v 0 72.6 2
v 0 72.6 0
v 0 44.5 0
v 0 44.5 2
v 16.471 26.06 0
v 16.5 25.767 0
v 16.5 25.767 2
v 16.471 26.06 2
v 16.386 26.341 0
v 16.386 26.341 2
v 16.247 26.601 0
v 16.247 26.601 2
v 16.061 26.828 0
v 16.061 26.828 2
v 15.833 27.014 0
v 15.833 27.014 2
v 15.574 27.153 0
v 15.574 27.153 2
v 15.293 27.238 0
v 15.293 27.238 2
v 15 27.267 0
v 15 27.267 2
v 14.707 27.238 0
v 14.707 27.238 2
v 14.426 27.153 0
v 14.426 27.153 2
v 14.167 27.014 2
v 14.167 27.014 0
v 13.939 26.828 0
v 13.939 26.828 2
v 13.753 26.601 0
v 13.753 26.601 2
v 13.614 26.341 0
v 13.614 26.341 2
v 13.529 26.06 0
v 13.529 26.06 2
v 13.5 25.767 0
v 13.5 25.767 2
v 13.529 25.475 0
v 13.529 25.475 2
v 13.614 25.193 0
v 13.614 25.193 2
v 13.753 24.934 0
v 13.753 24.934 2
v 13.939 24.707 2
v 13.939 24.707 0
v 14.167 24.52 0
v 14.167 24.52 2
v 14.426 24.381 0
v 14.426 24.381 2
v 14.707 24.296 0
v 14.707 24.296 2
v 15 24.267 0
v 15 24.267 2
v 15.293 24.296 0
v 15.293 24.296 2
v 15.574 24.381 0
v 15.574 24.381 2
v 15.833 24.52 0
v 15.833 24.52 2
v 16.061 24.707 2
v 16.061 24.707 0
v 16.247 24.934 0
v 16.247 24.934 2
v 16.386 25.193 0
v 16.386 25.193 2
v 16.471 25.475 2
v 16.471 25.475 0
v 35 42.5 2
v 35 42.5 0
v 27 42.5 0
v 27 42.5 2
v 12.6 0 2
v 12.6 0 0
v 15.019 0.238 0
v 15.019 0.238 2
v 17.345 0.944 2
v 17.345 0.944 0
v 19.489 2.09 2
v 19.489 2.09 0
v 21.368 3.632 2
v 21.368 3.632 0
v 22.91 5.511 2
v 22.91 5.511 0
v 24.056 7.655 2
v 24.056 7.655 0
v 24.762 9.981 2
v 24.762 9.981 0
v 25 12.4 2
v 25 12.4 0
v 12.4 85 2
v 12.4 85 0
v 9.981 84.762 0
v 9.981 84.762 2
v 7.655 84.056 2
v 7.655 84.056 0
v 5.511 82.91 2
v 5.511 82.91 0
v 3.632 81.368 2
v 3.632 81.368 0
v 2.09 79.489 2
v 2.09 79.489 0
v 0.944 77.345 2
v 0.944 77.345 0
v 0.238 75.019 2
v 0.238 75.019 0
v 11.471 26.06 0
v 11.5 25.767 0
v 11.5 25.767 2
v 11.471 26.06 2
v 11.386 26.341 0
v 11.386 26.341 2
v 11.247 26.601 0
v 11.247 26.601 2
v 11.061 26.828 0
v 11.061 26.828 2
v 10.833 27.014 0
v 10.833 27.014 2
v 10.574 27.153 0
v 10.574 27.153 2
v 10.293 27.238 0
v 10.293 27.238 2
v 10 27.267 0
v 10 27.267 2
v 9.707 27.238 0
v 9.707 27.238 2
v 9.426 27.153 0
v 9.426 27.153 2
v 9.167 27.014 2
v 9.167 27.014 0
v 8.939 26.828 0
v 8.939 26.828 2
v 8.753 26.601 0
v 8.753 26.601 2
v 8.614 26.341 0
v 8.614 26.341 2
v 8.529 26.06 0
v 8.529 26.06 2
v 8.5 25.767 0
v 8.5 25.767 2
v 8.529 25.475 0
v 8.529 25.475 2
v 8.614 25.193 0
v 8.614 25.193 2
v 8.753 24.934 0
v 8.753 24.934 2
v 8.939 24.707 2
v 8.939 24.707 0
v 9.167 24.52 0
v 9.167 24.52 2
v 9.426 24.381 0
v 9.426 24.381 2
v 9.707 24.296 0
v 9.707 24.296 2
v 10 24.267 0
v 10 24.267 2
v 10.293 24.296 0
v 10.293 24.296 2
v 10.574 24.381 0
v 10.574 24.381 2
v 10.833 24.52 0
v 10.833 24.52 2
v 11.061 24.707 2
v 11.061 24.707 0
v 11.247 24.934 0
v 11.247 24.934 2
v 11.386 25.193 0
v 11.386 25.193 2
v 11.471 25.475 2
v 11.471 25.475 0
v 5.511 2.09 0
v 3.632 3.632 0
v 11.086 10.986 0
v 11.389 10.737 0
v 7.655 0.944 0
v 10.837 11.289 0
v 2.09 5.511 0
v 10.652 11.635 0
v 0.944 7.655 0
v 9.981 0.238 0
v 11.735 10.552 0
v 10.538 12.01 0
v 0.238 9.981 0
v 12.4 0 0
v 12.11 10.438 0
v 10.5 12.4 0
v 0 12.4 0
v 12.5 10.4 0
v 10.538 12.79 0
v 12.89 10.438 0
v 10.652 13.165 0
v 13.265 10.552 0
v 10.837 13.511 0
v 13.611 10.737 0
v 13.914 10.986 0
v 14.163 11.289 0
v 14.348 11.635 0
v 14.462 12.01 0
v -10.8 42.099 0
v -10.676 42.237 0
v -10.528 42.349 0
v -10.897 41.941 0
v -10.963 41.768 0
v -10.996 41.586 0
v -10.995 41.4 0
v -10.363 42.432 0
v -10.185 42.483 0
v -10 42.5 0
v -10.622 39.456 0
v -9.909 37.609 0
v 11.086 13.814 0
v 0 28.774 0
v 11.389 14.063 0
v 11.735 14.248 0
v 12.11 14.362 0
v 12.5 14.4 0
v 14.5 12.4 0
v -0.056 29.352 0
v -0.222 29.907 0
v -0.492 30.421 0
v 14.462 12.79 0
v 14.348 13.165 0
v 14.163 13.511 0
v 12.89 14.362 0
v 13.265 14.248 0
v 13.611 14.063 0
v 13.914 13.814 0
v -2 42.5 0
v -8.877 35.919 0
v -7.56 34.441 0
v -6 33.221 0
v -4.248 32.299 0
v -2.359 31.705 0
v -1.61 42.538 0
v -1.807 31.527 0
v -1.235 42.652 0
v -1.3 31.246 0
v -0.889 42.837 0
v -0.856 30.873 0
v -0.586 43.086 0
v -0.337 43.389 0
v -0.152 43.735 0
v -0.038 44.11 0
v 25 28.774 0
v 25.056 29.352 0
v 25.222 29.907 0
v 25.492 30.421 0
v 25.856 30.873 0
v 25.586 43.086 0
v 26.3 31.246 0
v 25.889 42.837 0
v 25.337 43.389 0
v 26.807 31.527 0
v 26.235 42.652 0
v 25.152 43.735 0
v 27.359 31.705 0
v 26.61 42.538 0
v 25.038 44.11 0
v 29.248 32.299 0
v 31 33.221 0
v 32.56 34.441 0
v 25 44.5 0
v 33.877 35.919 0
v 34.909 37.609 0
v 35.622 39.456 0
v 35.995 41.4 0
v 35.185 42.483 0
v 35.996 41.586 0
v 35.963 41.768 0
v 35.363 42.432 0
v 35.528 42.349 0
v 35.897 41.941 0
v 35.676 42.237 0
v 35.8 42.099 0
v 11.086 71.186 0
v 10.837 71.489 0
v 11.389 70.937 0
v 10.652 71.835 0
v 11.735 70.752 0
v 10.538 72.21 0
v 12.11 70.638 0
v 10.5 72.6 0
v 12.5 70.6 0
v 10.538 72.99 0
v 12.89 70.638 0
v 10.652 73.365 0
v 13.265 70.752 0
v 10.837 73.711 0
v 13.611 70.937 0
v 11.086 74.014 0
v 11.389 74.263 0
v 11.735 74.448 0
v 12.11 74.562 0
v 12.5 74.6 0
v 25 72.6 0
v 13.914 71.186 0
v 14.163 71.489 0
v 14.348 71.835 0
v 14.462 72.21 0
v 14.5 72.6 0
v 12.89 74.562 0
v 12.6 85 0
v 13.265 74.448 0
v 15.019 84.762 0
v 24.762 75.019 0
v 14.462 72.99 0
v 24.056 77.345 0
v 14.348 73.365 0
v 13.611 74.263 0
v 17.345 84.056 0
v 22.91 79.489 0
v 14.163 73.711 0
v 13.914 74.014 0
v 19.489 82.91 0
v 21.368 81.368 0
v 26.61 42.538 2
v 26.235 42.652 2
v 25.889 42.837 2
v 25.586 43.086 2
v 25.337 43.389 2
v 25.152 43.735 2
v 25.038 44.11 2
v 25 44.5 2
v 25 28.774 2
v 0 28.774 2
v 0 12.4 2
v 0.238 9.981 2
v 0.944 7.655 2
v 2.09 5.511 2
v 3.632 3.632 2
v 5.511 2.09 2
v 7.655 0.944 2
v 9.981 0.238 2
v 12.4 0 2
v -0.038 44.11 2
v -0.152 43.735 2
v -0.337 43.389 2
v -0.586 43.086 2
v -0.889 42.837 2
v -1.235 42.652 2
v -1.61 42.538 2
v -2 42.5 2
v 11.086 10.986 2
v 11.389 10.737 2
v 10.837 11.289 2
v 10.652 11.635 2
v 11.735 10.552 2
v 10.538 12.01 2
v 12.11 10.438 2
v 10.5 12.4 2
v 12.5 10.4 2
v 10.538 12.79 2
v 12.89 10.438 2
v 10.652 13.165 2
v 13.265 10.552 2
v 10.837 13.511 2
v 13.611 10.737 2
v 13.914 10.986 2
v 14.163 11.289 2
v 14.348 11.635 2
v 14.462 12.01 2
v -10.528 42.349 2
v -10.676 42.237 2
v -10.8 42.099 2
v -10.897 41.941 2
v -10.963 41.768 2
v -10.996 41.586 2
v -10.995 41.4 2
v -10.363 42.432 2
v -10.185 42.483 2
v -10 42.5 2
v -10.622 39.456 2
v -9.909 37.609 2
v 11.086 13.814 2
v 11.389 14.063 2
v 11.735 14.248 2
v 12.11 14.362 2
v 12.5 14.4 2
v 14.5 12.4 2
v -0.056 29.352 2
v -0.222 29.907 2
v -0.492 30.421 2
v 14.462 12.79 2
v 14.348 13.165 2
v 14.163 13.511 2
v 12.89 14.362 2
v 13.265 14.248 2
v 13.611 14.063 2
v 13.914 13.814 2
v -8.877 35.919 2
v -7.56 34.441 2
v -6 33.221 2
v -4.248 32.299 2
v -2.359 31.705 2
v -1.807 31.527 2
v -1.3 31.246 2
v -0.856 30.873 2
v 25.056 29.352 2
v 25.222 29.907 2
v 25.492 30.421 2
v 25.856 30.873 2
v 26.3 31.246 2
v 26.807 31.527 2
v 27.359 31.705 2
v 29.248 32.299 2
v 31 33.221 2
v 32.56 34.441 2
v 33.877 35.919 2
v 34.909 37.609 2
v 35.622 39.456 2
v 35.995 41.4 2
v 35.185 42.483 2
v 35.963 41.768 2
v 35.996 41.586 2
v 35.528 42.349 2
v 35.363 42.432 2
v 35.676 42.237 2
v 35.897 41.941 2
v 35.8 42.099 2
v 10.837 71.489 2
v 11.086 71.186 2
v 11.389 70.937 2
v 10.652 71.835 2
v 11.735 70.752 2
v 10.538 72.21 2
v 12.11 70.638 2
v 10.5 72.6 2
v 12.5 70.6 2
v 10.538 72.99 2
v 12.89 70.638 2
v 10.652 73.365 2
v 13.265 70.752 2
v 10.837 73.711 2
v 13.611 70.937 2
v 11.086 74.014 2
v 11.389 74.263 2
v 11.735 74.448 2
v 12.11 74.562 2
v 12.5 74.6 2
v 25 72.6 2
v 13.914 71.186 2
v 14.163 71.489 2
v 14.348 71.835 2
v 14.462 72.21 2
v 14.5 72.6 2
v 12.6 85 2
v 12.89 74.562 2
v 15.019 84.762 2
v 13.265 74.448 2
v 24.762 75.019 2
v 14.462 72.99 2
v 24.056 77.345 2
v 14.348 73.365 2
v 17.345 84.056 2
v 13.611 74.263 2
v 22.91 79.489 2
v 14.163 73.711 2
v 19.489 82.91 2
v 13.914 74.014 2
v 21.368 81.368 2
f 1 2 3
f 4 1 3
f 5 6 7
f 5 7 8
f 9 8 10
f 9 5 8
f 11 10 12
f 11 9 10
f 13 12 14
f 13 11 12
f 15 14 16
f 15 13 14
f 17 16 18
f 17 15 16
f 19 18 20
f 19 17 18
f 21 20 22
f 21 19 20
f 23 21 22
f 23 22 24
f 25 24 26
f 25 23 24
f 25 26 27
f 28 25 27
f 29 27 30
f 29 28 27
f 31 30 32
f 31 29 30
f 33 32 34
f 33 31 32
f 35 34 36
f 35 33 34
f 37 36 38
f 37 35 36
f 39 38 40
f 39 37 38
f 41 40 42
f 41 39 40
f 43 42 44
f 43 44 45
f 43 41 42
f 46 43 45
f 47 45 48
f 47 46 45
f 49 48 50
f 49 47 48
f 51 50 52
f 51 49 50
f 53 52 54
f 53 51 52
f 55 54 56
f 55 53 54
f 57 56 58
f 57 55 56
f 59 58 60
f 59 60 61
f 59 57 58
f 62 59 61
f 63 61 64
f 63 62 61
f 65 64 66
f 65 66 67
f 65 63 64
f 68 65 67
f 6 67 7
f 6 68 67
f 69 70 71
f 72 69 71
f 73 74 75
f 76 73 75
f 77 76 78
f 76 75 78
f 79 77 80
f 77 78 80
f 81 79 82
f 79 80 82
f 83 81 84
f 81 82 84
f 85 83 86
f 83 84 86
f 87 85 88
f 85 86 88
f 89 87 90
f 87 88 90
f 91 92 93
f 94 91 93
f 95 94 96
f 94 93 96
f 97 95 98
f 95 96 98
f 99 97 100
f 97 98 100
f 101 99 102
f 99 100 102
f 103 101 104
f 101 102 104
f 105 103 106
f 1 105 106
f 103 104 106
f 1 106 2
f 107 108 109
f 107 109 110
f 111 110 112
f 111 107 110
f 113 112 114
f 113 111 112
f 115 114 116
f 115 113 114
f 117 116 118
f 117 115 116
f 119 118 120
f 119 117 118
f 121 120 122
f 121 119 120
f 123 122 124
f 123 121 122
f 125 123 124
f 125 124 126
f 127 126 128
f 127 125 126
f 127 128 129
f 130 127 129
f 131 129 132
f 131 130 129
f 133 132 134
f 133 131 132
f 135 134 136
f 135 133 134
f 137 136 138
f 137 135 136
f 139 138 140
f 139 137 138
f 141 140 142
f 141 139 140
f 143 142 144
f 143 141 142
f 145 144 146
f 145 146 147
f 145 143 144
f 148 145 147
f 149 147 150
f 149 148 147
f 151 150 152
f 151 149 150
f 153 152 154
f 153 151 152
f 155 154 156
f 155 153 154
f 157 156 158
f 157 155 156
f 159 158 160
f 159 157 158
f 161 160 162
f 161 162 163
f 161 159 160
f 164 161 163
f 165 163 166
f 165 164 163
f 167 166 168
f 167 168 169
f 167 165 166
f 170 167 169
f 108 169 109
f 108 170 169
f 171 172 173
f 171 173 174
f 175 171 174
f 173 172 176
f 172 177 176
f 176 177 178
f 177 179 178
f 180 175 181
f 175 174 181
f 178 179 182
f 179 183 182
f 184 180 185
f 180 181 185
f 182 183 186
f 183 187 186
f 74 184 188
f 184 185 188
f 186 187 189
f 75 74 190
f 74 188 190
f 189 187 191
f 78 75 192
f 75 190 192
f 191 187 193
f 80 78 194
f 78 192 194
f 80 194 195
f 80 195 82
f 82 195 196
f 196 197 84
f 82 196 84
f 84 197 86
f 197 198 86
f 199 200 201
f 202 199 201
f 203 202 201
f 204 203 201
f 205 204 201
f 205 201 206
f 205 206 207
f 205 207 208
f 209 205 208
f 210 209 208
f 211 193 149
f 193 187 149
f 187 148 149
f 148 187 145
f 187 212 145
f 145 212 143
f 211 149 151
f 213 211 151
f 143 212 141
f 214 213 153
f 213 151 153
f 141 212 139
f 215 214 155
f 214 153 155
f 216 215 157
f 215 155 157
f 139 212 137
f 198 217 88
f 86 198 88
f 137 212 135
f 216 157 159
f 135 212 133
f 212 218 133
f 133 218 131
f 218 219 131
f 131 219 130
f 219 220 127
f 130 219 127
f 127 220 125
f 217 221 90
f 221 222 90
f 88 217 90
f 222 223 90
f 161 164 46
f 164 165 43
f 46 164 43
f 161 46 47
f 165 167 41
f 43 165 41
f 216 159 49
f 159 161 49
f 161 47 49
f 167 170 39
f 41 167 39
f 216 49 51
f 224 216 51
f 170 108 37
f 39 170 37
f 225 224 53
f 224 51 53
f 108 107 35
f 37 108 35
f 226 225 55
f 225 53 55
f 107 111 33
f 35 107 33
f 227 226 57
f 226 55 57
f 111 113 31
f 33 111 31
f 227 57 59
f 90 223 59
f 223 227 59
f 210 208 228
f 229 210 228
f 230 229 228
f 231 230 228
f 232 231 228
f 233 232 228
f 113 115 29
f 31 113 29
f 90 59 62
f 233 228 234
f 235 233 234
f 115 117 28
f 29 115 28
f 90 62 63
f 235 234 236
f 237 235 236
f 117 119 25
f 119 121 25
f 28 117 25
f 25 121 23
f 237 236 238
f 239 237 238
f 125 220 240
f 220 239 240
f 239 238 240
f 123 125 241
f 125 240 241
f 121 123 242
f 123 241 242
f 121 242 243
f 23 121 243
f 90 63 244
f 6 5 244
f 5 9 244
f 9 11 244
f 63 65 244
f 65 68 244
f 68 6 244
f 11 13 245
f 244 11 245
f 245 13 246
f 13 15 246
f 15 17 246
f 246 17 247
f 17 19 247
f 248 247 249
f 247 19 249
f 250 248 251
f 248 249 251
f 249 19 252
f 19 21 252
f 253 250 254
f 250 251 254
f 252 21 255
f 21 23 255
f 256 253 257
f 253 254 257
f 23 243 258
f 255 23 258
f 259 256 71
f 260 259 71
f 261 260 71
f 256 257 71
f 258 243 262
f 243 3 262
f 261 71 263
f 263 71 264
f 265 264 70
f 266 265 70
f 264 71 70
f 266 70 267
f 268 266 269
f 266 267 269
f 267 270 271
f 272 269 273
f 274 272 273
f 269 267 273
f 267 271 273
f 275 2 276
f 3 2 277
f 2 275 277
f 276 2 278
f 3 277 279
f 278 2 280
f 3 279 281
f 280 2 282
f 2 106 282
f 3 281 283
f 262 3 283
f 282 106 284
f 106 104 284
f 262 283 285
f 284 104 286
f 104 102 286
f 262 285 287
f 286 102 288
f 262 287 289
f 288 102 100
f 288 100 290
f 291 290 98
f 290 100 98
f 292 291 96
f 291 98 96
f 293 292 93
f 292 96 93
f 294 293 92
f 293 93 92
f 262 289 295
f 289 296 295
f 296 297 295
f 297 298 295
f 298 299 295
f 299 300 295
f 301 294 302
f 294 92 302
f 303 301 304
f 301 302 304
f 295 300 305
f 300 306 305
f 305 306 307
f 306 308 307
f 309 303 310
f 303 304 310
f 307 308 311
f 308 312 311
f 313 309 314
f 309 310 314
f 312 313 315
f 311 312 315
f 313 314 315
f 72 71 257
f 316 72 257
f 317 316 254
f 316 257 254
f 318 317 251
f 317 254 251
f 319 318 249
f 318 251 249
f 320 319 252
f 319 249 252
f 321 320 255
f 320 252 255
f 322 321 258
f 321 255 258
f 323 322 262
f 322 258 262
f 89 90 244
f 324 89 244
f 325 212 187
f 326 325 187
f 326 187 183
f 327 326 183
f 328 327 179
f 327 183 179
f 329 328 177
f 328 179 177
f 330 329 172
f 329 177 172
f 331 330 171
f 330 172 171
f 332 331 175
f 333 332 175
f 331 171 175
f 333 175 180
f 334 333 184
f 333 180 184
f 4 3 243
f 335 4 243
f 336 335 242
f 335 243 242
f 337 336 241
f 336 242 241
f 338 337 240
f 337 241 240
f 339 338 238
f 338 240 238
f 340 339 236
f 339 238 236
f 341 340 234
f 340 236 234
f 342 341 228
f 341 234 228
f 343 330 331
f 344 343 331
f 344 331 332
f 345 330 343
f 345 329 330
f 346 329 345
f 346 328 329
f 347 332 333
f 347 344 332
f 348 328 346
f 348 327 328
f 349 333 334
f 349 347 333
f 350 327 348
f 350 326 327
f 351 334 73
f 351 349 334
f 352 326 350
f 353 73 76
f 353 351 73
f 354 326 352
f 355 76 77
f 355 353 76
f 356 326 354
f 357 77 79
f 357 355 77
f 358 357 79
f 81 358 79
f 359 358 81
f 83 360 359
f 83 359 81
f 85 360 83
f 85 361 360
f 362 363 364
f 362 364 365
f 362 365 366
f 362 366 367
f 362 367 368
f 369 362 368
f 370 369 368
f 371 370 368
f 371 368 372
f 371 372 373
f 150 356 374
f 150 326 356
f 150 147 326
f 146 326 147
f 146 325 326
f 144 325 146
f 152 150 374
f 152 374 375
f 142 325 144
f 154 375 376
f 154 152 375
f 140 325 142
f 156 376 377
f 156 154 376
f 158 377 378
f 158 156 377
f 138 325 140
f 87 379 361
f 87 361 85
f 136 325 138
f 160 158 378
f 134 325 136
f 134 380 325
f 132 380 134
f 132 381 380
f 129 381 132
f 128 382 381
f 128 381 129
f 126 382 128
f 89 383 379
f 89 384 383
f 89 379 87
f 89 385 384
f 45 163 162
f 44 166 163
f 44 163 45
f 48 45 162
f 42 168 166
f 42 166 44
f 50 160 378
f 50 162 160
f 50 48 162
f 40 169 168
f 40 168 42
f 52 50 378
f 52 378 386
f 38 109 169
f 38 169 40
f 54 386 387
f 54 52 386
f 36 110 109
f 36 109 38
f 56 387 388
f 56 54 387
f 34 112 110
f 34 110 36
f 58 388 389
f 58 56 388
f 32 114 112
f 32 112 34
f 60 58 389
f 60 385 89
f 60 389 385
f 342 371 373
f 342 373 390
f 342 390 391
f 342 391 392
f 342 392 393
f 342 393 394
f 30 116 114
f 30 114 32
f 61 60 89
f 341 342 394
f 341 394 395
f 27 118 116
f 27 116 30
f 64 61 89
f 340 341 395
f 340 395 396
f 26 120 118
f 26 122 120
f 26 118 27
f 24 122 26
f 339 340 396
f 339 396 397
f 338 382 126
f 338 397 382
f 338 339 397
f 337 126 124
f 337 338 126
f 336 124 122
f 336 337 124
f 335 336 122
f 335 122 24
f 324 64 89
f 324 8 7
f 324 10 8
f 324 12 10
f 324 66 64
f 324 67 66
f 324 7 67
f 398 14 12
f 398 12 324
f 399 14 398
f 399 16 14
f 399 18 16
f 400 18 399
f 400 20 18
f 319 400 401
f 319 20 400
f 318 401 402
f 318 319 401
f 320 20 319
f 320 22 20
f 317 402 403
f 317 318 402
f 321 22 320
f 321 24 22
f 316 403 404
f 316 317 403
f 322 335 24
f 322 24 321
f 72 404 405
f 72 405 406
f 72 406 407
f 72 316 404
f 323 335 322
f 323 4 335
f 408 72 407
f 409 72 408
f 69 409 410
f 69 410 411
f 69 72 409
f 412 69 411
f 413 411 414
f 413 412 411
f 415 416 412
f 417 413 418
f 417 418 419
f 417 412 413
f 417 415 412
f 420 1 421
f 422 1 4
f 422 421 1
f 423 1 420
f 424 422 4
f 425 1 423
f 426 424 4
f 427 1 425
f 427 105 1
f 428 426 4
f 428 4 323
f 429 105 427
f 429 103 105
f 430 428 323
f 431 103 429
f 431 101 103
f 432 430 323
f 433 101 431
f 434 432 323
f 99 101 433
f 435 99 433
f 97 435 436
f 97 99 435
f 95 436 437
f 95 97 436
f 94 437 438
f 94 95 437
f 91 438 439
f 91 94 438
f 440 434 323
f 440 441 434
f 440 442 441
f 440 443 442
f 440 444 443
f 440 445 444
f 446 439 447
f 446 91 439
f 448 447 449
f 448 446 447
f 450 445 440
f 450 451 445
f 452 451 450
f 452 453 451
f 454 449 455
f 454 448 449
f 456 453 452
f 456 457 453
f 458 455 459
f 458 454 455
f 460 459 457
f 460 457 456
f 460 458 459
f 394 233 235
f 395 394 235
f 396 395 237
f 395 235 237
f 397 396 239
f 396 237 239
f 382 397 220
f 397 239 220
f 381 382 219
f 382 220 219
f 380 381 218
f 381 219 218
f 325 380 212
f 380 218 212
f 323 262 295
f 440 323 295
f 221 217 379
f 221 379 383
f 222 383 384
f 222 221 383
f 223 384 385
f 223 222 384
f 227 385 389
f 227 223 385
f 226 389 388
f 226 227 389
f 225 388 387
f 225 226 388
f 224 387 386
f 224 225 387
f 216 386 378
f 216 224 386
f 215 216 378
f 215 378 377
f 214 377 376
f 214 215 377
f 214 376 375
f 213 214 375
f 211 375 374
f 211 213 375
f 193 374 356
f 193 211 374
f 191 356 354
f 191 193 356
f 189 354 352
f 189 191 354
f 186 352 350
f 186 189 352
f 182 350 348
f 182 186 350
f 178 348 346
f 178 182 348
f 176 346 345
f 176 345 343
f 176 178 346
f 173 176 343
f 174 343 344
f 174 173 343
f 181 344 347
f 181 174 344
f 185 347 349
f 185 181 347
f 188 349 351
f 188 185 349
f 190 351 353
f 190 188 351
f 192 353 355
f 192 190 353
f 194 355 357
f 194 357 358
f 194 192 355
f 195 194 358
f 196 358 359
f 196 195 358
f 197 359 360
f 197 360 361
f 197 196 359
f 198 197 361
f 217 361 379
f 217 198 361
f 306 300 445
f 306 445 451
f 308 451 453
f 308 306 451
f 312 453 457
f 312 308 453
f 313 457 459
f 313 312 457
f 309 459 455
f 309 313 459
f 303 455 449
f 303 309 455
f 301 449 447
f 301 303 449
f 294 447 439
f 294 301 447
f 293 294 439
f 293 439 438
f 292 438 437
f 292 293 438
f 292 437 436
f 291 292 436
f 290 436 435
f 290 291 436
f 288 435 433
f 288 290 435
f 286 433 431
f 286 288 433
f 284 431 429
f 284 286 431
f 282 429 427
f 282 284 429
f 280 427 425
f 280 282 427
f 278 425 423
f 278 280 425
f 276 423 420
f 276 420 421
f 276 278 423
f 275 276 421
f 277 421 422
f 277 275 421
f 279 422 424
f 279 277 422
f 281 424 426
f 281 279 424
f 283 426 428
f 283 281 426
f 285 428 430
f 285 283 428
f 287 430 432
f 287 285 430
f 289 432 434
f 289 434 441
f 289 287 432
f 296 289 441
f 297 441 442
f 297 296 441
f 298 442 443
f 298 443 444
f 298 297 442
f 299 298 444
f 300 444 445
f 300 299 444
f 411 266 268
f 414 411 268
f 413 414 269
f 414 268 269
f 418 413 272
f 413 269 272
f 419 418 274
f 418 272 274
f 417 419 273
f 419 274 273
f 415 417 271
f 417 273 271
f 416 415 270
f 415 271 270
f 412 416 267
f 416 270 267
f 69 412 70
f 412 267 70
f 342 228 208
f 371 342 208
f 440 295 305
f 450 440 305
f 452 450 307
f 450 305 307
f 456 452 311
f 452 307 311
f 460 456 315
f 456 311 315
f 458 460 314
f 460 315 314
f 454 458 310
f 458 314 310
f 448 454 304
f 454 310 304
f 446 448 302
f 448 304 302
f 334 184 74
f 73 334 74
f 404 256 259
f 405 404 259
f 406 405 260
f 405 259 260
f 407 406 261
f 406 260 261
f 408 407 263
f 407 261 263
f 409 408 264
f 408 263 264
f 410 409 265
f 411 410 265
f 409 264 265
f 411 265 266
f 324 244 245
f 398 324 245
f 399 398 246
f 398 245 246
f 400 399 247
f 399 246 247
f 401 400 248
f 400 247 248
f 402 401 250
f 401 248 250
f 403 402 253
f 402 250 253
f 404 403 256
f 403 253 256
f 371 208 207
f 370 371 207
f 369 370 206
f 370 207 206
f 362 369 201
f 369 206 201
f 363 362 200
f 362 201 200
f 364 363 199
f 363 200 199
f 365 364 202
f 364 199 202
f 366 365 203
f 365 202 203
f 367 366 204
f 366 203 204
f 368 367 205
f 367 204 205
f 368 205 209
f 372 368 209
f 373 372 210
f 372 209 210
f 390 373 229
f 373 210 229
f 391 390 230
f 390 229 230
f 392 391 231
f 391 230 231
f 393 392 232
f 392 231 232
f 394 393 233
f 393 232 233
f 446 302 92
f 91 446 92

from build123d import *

# Parameters (mm, degrees)
SKETCH1_R           = 2
SKETCH1_R_2         = 1.5
BOSS_EXTRUDE1_DEPTH = 2


with BuildPart() as part:
    # Sketch1 → Boss-Extrude1 (new body)
    with BuildSketch(Plane.XY):
        with BuildLine():
            Line((12.4, 0), (12.6, 0))
            ThreePointArc((12.6, 0), (21.368124087, 3.631875913), (25, 12.4))
            Line((25, 12.4), (25, 28.774148297))
            ThreePointArc((25, 28.774148297), (25.663151139, 30.655407822), (27.359424934, 31.704961083))
            ThreePointArc((27.359424934, 31.704961083), (33.251440199, 35.15061323), (35.99503719, 41.400496281))
            ThreePointArc((35.99503719, 41.400496281), (35.741452534, 42.171005321), (35, 42.5))
            Line((35, 42.5), (27, 42.5))
            ThreePointArc((27, 42.5), (25.585786438, 43.085786438), (25, 44.5))
            Line((25, 44.5), (25, 72.6))
            ThreePointArc((25, 72.6), (21.368124087, 81.368124087), (12.6, 85))
            Line((12.6, 85), (12.4, 85))
            ThreePointArc((12.4, 85), (3.631875913, 81.368124087), (0, 72.6))
            Line((0, 72.6), (0, 44.5))
            ThreePointArc((0, 44.5), (-0.585786438, 43.085786438), (-2, 42.5))
            Line((-2, 42.5), (-10, 42.5))
            ThreePointArc((-10, 42.5), (-10.741452534, 42.171005321), (-10.99503719, 41.400496281))
            ThreePointArc((-10.99503719, 41.400496281), (-8.251440199, 35.15061323), (-2.359424934, 31.704961083))
            ThreePointArc((-2.359424934, 31.704961083), (-0.663151139, 30.655407822), (0, 28.774148297))
            Line((0, 28.774148297), (0, 12.4))
            ThreePointArc((0, 12.4), (3.631875913, 3.631875913), (12.4, 0))
        make_face()
        with Locations((12.5, 72.6)):
            Circle(SKETCH1_R, mode=Mode.SUBTRACT)
        with Locations((12.5, 12.4)):
            Circle(SKETCH1_R, mode=Mode.SUBTRACT)
        with Locations((10, 25.767183826)):
            Circle(SKETCH1_R_2, mode=Mode.SUBTRACT)
        with Locations((15, 25.767183826)):
            Circle(SKETCH1_R_2, mode=Mode.SUBTRACT)
    extrude(amount=BOSS_EXTRUDE1_DEPTH)


solid = part.part
